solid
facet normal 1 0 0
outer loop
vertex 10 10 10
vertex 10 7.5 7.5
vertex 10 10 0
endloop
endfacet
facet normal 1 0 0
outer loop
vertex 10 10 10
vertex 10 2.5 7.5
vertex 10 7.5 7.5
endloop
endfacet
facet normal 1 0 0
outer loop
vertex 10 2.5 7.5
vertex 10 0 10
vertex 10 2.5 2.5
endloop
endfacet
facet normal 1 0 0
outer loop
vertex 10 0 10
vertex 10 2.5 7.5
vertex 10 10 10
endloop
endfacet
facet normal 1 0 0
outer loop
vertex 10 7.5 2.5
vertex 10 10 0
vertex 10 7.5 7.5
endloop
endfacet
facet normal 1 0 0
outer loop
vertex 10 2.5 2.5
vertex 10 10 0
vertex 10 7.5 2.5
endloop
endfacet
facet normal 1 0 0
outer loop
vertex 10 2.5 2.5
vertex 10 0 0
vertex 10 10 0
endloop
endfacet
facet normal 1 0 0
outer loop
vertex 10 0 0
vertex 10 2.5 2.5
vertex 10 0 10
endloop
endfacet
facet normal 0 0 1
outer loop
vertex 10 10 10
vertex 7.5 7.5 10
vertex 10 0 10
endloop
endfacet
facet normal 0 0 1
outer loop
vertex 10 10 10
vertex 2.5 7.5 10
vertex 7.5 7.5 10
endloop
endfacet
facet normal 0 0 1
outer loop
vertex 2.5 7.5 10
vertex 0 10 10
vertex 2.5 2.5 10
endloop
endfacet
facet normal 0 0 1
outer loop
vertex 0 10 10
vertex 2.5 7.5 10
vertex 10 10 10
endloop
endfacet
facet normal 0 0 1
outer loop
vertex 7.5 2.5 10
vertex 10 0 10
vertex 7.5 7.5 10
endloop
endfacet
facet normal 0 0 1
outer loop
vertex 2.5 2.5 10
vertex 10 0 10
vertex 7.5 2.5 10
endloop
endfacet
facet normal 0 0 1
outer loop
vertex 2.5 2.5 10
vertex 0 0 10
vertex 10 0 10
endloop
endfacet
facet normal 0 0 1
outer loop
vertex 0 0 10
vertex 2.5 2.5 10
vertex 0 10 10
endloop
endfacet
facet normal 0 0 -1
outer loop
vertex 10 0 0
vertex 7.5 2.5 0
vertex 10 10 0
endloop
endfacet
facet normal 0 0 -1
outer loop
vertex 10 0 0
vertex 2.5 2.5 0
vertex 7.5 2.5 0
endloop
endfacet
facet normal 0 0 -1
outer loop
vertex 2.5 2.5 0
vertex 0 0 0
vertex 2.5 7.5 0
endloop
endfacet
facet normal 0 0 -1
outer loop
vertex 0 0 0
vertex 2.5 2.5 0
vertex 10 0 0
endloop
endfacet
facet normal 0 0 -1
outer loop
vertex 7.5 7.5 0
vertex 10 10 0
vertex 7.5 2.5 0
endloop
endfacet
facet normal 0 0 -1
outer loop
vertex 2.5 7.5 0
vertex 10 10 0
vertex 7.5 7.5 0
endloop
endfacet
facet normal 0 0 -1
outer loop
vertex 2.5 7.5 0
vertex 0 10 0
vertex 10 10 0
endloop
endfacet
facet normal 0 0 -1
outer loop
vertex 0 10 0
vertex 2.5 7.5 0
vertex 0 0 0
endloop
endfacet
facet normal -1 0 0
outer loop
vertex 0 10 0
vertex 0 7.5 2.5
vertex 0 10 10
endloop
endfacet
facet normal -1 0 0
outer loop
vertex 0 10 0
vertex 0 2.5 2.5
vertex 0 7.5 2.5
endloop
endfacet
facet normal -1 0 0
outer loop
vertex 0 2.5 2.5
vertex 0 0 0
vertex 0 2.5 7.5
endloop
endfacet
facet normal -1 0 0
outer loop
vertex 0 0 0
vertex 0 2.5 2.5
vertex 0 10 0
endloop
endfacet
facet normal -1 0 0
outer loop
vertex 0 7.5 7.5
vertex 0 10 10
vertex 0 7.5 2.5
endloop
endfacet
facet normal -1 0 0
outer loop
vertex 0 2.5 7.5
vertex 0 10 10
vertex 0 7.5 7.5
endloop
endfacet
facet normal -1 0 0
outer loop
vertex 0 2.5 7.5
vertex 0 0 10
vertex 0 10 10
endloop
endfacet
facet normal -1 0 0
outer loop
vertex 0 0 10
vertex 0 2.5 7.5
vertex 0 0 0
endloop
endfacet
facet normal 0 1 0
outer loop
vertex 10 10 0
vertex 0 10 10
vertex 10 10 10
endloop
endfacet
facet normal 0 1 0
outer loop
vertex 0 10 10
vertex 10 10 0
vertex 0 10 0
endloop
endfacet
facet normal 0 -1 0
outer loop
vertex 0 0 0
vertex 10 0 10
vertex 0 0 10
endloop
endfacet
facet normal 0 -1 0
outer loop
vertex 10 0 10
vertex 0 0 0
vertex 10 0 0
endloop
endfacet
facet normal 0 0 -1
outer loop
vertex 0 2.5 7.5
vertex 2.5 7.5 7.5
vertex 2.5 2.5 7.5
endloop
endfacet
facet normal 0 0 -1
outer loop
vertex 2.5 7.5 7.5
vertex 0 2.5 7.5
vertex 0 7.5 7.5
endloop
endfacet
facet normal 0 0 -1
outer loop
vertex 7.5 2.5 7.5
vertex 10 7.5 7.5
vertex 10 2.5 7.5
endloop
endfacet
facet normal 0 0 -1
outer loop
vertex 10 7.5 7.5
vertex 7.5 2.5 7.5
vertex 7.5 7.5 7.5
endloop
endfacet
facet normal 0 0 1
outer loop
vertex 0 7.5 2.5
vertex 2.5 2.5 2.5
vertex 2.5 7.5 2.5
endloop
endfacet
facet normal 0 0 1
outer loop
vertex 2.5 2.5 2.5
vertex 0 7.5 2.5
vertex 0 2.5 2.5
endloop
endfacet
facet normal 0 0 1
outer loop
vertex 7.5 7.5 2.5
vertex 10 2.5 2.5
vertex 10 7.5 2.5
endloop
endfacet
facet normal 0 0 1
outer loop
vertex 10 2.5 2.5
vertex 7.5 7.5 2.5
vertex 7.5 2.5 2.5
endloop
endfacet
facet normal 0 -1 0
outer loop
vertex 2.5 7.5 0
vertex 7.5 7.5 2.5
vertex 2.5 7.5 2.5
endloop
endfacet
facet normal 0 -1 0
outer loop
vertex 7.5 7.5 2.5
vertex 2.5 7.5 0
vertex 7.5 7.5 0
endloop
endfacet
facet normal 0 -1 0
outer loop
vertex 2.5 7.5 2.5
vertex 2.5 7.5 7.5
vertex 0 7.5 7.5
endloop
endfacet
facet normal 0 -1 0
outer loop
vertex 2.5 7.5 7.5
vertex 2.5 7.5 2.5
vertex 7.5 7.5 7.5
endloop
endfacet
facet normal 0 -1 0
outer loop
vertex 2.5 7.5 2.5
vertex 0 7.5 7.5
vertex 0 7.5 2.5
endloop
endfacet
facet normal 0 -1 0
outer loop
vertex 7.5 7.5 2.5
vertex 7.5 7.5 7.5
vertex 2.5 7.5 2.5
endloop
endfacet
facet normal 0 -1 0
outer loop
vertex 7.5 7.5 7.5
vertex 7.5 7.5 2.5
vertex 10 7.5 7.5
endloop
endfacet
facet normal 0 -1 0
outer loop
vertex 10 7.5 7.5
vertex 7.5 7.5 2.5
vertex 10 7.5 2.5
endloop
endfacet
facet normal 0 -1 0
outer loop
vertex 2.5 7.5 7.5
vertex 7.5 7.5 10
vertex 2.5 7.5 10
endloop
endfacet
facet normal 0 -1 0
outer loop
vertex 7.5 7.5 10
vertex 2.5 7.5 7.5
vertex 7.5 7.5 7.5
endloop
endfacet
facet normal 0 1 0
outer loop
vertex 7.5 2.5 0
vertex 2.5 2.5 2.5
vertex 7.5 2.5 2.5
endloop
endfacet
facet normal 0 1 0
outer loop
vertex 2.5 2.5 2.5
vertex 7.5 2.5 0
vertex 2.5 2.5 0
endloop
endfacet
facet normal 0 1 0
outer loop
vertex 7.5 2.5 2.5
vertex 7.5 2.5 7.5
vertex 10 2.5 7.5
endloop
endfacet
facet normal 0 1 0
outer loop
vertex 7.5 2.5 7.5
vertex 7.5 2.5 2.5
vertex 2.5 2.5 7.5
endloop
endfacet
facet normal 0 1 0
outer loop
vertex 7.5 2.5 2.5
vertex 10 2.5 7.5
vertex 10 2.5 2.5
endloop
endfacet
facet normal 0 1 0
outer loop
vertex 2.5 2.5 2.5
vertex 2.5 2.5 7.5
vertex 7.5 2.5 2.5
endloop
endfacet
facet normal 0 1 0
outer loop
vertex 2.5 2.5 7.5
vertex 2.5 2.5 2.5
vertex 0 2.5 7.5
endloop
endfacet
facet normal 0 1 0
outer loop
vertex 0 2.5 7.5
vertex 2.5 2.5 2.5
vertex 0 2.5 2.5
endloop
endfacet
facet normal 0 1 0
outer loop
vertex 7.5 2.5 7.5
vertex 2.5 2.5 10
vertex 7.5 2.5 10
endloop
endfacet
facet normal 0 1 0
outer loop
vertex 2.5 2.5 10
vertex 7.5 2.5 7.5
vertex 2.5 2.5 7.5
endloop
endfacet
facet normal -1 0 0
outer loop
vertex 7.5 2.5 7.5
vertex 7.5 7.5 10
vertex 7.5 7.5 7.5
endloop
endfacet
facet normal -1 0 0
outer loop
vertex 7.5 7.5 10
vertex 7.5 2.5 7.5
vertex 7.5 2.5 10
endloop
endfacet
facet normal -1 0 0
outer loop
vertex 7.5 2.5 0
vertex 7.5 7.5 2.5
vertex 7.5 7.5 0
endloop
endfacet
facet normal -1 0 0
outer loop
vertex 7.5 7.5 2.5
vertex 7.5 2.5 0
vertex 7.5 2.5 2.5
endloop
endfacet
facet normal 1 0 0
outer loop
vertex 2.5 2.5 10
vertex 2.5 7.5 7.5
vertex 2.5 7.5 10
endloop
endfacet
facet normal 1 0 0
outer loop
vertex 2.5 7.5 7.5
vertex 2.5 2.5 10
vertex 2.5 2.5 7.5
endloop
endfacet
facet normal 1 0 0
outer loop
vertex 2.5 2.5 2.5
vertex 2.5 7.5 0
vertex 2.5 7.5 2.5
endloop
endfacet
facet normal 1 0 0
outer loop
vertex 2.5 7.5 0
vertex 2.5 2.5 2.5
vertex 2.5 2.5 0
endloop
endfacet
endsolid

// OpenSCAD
difference(){
     cube([10, 10, 10]);
      
     #translate([-1,2.5,2.5]) cube([12, 5, 5]);
     #translate([2.5,2.5,-1]) cube([5, 5, 12]);
}
